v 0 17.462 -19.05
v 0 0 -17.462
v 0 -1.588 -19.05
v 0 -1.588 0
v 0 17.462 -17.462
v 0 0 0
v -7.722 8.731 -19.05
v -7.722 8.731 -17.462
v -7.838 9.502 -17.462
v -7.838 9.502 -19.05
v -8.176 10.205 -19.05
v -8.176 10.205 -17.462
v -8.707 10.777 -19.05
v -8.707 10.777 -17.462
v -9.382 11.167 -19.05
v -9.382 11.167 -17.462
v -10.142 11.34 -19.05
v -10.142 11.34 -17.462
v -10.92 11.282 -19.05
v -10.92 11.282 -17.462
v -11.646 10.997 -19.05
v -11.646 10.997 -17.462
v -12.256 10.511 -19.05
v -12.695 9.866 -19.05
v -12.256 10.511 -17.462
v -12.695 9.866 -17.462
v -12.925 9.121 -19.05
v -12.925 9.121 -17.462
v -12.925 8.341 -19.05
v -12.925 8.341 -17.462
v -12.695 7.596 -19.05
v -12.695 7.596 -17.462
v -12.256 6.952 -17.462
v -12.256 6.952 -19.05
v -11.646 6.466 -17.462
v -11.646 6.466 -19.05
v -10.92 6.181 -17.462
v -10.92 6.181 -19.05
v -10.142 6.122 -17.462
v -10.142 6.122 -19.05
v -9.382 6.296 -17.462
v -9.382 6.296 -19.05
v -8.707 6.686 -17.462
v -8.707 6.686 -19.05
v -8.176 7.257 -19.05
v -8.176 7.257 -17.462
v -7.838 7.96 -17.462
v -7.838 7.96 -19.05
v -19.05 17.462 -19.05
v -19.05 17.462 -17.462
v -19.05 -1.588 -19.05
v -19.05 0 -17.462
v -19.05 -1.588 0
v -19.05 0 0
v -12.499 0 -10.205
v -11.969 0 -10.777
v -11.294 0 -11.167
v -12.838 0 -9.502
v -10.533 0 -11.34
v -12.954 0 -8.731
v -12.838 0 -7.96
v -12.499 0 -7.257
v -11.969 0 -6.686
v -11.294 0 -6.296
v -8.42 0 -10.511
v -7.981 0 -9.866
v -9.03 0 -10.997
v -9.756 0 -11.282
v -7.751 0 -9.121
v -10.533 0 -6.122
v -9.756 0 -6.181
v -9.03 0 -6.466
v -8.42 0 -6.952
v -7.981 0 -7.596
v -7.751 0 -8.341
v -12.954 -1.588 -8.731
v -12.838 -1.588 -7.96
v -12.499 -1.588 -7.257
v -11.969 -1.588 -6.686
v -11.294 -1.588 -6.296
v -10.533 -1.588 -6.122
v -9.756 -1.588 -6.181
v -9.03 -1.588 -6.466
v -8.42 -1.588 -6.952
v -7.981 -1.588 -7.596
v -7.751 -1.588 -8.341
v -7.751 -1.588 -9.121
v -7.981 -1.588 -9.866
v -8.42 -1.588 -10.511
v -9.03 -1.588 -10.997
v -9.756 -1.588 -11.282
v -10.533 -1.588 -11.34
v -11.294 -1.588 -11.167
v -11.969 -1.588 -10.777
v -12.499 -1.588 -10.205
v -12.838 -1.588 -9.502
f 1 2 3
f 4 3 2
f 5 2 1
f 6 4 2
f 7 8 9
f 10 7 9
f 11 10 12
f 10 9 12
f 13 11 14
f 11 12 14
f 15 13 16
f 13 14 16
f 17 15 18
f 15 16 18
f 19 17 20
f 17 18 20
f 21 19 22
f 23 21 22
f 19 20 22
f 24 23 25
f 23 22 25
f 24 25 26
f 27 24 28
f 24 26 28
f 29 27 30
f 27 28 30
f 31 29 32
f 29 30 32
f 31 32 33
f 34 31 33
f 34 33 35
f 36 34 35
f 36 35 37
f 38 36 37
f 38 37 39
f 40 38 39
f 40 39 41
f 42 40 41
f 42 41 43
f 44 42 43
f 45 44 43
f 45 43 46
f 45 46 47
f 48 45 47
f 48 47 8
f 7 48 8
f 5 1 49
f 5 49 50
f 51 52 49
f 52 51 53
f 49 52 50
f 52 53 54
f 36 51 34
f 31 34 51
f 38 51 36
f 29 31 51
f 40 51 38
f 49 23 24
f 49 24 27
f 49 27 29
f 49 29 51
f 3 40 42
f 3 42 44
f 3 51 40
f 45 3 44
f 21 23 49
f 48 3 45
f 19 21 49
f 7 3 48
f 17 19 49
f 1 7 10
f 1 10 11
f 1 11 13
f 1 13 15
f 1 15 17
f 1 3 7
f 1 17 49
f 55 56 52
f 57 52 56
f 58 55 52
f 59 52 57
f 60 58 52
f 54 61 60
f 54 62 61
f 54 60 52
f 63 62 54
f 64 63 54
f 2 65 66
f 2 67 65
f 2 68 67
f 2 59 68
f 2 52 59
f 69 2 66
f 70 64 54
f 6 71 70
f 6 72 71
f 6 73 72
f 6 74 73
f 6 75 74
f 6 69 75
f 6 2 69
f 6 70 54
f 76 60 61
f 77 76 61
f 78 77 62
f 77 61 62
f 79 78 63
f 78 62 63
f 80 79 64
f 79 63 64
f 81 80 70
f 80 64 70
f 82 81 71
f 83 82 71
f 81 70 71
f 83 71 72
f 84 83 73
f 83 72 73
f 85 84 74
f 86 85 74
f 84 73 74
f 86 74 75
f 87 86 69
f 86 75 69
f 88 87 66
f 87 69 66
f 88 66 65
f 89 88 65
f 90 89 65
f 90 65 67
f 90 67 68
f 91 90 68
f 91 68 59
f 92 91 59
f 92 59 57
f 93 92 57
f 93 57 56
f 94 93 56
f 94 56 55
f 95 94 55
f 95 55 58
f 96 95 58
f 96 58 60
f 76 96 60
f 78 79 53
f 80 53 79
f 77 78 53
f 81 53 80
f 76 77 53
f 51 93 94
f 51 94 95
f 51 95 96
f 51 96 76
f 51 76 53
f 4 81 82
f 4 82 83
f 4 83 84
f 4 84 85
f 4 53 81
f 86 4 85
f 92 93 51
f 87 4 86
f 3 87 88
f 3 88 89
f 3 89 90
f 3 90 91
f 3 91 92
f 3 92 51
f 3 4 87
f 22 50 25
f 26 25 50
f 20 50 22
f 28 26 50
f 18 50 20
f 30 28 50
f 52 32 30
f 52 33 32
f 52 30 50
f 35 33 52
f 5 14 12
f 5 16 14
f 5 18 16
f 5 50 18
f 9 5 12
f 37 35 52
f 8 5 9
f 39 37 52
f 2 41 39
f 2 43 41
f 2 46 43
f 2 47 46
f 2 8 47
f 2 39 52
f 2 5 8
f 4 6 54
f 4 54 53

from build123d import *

# Parameters (mm, degrees)
F1_DEPTH = 19.05
F2_R     = 2.6162
F3_DEPTH = 25.4
F4_R     = 2.6162
F5_DEPTH = 25.4


with BuildPart() as f1:
    # F0 (on Right) → F1 (new body)
    with BuildSketch(Plane.YZ):
        Polygon((0, -17.4625), (0, 0), (-1.5875, 0), (-1.5875, -19.05), (17.4625, -19.05), (17.4625, -17.4625), align=None)
    extrude(amount=-F1_DEPTH)

    # F2 (on face) → F3 (cut)
    with BuildSketch(Plane.XY.offset(-17.4625)):
        with Locations((-10.3378, 8.73125)):
            Circle(F2_R)
    extrude(amount=-F3_DEPTH, mode=Mode.SUBTRACT)

    # F4 (on face) → F5 (cut)
    with BuildSketch(Plane(origin=(0, 0, 0), x_dir=(-1, 0, 0), z_dir=(0, 1, 0))):
        with Locations((10.3378, -8.73125)):
            Circle(F4_R)
    extrude(amount=-F5_DEPTH, mode=Mode.SUBTRACT)


solid = f1.part
